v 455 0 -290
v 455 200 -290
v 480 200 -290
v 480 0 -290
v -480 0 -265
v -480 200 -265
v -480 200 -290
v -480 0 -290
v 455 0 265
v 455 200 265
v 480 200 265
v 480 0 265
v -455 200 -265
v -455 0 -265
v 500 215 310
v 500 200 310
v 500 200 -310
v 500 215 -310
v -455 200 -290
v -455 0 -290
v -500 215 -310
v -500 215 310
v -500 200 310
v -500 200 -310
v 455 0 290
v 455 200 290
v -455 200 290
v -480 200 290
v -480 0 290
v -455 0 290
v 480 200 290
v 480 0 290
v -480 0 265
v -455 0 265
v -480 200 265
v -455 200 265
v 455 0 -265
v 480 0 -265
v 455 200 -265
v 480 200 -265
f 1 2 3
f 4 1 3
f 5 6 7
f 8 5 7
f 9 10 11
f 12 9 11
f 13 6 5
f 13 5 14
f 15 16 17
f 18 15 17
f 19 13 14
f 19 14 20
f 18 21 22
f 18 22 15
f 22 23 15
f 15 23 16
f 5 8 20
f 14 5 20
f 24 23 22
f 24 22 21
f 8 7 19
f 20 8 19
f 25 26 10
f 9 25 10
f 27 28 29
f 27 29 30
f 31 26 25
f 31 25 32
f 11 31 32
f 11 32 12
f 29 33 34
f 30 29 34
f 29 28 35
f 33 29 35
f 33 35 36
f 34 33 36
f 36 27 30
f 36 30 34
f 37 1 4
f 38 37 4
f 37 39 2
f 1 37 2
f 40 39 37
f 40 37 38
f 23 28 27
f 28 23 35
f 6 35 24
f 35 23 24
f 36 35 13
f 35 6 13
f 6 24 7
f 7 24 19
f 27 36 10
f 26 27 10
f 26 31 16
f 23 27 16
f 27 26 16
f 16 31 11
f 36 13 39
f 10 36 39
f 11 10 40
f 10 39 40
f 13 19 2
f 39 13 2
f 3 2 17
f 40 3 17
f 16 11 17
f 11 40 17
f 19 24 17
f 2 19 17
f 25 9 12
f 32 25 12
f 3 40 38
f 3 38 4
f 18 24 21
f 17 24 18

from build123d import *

# Parameters (mm, degrees)
SKETCH1_W             = 25
SKETCH1_H             = 25
BOSS_EXTRUDE1_DEPTH   = 200
BOSS_EXTRUDE1_2_DEPTH = 200
BOSS_EXTRUDE1_3_DEPTH = 200
BOSS_EXTRUDE1_4_DEPTH = 200
SKETCH2_W             = 1000
SKETCH2_H             = 620
BOSS_EXTRUDE2_DEPTH   = 15


with BuildPart() as part:
    # Sketch1 → Boss-Extrude1 (new body)
    with BuildSketch(Plane(origin=(0, 0, 0), x_dir=(1, 0, 0), z_dir=(0, 1, 0))):
        with Locations((-467.5, -277.5)):
            Rectangle(SKETCH1_W, SKETCH1_H)
    extrude(amount=BOSS_EXTRUDE1_DEPTH)



with BuildPart() as body_2:
    # Sketch1 → Boss-Extrude1 2 (new body)
    with BuildSketch(Plane(origin=(0, 0, 0), x_dir=(1, 0, 0), z_dir=(0, 1, 0))):
        with Locations((-467.5, 277.5)):
            Rectangle(SKETCH1_W, SKETCH1_H)
    extrude(amount=BOSS_EXTRUDE1_2_DEPTH)


with BuildPart() as body_3:
    # Sketch1 → Boss-Extrude1 3 (new body)
    with BuildSketch(Plane(origin=(0, 0, 0), x_dir=(1, 0, 0), z_dir=(0, 1, 0))):
        with Locations((467.5, 277.5)):
            Rectangle(SKETCH1_W, SKETCH1_H)
    extrude(amount=BOSS_EXTRUDE1_3_DEPTH)


with BuildPart() as body_4:
    # Sketch1 → Boss-Extrude1 4 (new body)
    with BuildSketch(Plane(origin=(0, 0, 0), x_dir=(1, 0, 0), z_dir=(0, 1, 0))):
        with Locations((467.5, -277.5)):
            Rectangle(SKETCH1_W, SKETCH1_H)
    extrude(amount=BOSS_EXTRUDE1_4_DEPTH)


with BuildPart() as part_1:
    add(part.part)

    add(body_2.part)  # Boss-Extrude2 merges body 2

    add(body_3.part)  # Boss-Extrude2 merges body 3

    add(body_4.part)  # Boss-Extrude2 merges body 4
    # Sketch2 → Boss-Extrude2 (add)
    with BuildSketch(Plane(origin=(0, 200, 0), x_dir=(1, 0, 0), z_dir=(0, 1, 0))):
        Rectangle(SKETCH2_W, SKETCH2_H)
    extrude(amount=BOSS_EXTRUDE2_DEPTH)


solid = part_1.part
